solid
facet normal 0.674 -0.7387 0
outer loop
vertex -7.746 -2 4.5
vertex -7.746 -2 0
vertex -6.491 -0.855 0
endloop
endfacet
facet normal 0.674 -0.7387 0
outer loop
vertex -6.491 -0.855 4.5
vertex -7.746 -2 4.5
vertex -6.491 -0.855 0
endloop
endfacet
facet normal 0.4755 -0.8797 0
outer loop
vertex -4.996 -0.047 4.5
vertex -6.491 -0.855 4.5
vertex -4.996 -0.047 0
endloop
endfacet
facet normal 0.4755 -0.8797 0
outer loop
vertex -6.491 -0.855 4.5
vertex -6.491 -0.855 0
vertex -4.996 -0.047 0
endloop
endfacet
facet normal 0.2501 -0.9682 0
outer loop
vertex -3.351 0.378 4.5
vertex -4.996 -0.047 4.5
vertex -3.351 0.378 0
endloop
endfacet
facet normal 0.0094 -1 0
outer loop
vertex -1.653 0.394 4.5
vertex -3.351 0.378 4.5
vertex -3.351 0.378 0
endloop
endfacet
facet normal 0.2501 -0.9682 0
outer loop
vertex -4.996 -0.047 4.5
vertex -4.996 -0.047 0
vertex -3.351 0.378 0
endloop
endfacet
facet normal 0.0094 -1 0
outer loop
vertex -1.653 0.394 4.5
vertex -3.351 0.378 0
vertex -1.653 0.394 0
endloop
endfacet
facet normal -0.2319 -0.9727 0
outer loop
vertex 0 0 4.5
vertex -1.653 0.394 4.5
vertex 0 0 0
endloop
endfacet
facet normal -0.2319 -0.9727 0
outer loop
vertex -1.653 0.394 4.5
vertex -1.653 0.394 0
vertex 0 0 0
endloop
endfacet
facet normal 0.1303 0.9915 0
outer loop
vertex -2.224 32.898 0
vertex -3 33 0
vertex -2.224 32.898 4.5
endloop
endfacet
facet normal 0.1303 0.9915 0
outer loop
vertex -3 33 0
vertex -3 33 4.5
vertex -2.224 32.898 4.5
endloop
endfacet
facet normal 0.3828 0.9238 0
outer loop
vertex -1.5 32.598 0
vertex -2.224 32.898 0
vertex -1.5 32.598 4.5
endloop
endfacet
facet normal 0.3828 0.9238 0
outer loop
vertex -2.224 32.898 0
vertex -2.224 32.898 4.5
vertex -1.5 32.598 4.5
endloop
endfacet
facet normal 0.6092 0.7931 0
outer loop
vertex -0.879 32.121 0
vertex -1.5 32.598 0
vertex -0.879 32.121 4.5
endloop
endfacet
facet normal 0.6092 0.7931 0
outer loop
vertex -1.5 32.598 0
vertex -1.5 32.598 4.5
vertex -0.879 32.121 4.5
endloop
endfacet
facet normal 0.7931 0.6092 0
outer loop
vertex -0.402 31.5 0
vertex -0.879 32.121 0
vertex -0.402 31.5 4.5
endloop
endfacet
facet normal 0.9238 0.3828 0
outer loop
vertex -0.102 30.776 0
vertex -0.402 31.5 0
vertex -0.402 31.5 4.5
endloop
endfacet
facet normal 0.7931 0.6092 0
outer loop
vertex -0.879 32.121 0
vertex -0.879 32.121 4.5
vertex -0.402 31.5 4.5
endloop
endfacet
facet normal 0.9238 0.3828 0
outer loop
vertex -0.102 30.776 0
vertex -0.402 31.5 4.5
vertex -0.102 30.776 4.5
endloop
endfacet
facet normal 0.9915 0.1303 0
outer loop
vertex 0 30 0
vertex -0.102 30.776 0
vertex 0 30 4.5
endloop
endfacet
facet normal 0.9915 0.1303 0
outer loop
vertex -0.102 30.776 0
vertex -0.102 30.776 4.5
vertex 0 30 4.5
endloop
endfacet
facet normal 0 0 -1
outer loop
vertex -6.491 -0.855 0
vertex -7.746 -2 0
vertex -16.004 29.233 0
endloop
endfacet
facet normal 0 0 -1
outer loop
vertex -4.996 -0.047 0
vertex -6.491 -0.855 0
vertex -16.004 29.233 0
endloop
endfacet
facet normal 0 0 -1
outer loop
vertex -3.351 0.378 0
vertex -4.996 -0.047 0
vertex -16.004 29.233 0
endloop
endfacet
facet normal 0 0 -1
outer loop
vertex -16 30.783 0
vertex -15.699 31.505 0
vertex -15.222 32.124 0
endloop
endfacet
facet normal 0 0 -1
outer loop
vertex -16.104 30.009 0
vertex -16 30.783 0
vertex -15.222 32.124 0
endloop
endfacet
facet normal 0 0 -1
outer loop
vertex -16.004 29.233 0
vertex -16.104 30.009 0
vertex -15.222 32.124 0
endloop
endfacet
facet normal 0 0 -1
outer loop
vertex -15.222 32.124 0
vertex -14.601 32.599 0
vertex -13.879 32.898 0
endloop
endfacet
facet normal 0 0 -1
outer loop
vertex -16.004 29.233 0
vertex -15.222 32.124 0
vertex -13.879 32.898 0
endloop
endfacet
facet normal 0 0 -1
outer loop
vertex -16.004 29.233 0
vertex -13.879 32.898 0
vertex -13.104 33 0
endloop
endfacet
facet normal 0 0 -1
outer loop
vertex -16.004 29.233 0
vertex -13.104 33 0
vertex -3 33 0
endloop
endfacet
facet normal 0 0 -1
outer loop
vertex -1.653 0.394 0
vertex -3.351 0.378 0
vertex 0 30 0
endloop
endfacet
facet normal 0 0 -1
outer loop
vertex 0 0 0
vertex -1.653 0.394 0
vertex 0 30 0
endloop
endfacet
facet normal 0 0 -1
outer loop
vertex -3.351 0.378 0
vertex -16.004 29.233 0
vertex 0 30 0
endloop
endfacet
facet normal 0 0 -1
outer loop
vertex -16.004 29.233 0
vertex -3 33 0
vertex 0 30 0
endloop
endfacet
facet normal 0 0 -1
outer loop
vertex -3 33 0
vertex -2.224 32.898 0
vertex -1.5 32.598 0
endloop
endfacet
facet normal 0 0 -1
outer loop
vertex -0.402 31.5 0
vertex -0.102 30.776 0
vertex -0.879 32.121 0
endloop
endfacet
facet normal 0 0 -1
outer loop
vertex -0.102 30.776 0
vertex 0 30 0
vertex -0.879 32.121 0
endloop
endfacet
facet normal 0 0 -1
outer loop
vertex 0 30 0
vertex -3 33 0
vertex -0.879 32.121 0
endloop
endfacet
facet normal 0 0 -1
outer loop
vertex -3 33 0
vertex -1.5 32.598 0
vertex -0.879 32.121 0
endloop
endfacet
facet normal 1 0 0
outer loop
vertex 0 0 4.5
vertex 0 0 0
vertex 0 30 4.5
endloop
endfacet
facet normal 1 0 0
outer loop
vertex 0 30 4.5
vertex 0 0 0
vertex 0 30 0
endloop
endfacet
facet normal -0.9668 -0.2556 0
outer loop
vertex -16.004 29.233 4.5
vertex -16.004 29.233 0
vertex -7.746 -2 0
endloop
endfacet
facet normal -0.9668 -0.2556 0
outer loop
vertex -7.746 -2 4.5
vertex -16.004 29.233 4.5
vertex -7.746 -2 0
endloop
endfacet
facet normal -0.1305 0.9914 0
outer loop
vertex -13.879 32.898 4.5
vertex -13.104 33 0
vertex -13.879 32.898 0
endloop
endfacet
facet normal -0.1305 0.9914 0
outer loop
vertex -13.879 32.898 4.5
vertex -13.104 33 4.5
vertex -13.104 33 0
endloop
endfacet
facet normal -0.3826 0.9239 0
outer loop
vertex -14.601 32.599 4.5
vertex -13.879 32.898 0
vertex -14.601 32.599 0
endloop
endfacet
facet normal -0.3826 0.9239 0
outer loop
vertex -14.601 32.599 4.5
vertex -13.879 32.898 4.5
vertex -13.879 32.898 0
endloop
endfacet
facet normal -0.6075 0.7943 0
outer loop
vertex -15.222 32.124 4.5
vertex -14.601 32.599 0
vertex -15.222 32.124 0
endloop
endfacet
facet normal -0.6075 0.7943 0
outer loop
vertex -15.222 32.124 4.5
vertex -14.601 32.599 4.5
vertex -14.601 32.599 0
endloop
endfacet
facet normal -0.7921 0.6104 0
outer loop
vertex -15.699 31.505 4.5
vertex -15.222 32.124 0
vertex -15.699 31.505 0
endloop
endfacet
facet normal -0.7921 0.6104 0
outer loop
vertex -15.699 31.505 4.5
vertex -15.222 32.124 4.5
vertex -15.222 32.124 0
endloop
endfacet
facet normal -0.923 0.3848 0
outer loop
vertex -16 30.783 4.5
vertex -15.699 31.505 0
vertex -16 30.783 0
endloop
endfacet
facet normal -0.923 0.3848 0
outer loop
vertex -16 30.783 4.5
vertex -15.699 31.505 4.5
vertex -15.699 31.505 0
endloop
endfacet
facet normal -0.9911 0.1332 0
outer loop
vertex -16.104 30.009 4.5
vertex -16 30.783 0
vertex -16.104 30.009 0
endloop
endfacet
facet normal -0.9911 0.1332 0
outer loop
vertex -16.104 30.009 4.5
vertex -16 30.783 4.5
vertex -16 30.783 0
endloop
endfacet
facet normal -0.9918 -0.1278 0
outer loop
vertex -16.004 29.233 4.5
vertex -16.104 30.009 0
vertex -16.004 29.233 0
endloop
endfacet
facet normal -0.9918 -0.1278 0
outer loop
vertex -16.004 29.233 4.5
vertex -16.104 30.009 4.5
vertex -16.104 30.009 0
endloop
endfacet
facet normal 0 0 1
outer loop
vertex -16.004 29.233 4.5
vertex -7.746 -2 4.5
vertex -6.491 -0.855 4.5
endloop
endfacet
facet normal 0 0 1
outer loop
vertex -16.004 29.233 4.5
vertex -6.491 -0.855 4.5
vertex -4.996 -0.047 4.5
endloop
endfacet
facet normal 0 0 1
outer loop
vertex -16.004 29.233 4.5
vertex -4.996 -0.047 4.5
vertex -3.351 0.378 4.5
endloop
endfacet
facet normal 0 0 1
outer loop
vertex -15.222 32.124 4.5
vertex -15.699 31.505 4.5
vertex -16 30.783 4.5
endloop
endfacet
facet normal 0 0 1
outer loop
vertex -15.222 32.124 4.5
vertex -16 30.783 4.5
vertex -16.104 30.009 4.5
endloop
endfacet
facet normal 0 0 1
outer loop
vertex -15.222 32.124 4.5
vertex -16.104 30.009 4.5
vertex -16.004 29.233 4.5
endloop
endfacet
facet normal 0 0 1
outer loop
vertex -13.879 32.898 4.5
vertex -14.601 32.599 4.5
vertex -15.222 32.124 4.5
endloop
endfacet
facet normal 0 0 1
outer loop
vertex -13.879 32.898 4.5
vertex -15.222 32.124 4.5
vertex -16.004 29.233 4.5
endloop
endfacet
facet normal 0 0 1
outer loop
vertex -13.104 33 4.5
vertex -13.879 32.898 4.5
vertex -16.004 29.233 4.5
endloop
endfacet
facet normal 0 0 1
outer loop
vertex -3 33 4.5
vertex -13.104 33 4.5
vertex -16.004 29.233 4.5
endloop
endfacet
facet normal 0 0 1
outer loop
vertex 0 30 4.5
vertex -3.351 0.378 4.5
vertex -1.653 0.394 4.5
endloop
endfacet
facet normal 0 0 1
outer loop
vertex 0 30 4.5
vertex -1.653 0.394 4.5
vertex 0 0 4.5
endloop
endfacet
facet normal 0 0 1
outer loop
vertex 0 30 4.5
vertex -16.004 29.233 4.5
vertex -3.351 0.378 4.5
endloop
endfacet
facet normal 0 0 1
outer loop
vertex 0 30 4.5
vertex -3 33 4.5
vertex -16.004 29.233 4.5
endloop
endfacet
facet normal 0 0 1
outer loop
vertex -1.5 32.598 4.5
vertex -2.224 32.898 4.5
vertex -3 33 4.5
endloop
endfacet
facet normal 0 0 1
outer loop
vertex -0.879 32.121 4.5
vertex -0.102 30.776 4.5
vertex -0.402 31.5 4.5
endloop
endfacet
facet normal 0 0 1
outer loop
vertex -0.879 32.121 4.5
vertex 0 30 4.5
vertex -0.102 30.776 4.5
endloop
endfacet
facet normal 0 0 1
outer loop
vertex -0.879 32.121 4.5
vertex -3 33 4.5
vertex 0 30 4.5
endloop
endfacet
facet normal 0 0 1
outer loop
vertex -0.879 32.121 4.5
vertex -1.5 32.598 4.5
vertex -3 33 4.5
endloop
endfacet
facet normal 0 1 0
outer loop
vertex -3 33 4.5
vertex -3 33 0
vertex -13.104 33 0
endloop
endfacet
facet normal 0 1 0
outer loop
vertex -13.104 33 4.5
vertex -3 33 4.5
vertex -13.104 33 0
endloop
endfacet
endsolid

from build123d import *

# Parameters (mm, degrees)
BOSS_EXTRU_1_DEPTH = 4.5
CONG_8_R           = 3
CONG_9_R           = 3


with BuildPart() as part:
    # Esquisse1 → Boss.-Extru.1 (new body)
    with BuildSketch(Plane.XY):
        with BuildLine():
            Line((0, 0), (0, 33))
            Line((0, 33), (-17, 33))
            Line((-17, 33), (-7.745966692, -2))
            ThreePointArc((-7.745966692, -2), (-4.186842685, 0.215571991), (0, 0))
        make_face()
    extrude(amount=BOSS_EXTRU_1_DEPTH)

    # Congé8
    cong_8_edges = [part.edges().sort_by_distance(p)[0] for p in [
        (-17, 33, 2.25),
    ]]
    fillet(cong_8_edges, radius=CONG_8_R)

    # Congé9
    cong_9_edges = [part.edges().sort_by_distance(p)[0] for p in [
        (0, 33, 2.25),
    ]]
    fillet(cong_9_edges, radius=CONG_9_R)


solid = part.part
